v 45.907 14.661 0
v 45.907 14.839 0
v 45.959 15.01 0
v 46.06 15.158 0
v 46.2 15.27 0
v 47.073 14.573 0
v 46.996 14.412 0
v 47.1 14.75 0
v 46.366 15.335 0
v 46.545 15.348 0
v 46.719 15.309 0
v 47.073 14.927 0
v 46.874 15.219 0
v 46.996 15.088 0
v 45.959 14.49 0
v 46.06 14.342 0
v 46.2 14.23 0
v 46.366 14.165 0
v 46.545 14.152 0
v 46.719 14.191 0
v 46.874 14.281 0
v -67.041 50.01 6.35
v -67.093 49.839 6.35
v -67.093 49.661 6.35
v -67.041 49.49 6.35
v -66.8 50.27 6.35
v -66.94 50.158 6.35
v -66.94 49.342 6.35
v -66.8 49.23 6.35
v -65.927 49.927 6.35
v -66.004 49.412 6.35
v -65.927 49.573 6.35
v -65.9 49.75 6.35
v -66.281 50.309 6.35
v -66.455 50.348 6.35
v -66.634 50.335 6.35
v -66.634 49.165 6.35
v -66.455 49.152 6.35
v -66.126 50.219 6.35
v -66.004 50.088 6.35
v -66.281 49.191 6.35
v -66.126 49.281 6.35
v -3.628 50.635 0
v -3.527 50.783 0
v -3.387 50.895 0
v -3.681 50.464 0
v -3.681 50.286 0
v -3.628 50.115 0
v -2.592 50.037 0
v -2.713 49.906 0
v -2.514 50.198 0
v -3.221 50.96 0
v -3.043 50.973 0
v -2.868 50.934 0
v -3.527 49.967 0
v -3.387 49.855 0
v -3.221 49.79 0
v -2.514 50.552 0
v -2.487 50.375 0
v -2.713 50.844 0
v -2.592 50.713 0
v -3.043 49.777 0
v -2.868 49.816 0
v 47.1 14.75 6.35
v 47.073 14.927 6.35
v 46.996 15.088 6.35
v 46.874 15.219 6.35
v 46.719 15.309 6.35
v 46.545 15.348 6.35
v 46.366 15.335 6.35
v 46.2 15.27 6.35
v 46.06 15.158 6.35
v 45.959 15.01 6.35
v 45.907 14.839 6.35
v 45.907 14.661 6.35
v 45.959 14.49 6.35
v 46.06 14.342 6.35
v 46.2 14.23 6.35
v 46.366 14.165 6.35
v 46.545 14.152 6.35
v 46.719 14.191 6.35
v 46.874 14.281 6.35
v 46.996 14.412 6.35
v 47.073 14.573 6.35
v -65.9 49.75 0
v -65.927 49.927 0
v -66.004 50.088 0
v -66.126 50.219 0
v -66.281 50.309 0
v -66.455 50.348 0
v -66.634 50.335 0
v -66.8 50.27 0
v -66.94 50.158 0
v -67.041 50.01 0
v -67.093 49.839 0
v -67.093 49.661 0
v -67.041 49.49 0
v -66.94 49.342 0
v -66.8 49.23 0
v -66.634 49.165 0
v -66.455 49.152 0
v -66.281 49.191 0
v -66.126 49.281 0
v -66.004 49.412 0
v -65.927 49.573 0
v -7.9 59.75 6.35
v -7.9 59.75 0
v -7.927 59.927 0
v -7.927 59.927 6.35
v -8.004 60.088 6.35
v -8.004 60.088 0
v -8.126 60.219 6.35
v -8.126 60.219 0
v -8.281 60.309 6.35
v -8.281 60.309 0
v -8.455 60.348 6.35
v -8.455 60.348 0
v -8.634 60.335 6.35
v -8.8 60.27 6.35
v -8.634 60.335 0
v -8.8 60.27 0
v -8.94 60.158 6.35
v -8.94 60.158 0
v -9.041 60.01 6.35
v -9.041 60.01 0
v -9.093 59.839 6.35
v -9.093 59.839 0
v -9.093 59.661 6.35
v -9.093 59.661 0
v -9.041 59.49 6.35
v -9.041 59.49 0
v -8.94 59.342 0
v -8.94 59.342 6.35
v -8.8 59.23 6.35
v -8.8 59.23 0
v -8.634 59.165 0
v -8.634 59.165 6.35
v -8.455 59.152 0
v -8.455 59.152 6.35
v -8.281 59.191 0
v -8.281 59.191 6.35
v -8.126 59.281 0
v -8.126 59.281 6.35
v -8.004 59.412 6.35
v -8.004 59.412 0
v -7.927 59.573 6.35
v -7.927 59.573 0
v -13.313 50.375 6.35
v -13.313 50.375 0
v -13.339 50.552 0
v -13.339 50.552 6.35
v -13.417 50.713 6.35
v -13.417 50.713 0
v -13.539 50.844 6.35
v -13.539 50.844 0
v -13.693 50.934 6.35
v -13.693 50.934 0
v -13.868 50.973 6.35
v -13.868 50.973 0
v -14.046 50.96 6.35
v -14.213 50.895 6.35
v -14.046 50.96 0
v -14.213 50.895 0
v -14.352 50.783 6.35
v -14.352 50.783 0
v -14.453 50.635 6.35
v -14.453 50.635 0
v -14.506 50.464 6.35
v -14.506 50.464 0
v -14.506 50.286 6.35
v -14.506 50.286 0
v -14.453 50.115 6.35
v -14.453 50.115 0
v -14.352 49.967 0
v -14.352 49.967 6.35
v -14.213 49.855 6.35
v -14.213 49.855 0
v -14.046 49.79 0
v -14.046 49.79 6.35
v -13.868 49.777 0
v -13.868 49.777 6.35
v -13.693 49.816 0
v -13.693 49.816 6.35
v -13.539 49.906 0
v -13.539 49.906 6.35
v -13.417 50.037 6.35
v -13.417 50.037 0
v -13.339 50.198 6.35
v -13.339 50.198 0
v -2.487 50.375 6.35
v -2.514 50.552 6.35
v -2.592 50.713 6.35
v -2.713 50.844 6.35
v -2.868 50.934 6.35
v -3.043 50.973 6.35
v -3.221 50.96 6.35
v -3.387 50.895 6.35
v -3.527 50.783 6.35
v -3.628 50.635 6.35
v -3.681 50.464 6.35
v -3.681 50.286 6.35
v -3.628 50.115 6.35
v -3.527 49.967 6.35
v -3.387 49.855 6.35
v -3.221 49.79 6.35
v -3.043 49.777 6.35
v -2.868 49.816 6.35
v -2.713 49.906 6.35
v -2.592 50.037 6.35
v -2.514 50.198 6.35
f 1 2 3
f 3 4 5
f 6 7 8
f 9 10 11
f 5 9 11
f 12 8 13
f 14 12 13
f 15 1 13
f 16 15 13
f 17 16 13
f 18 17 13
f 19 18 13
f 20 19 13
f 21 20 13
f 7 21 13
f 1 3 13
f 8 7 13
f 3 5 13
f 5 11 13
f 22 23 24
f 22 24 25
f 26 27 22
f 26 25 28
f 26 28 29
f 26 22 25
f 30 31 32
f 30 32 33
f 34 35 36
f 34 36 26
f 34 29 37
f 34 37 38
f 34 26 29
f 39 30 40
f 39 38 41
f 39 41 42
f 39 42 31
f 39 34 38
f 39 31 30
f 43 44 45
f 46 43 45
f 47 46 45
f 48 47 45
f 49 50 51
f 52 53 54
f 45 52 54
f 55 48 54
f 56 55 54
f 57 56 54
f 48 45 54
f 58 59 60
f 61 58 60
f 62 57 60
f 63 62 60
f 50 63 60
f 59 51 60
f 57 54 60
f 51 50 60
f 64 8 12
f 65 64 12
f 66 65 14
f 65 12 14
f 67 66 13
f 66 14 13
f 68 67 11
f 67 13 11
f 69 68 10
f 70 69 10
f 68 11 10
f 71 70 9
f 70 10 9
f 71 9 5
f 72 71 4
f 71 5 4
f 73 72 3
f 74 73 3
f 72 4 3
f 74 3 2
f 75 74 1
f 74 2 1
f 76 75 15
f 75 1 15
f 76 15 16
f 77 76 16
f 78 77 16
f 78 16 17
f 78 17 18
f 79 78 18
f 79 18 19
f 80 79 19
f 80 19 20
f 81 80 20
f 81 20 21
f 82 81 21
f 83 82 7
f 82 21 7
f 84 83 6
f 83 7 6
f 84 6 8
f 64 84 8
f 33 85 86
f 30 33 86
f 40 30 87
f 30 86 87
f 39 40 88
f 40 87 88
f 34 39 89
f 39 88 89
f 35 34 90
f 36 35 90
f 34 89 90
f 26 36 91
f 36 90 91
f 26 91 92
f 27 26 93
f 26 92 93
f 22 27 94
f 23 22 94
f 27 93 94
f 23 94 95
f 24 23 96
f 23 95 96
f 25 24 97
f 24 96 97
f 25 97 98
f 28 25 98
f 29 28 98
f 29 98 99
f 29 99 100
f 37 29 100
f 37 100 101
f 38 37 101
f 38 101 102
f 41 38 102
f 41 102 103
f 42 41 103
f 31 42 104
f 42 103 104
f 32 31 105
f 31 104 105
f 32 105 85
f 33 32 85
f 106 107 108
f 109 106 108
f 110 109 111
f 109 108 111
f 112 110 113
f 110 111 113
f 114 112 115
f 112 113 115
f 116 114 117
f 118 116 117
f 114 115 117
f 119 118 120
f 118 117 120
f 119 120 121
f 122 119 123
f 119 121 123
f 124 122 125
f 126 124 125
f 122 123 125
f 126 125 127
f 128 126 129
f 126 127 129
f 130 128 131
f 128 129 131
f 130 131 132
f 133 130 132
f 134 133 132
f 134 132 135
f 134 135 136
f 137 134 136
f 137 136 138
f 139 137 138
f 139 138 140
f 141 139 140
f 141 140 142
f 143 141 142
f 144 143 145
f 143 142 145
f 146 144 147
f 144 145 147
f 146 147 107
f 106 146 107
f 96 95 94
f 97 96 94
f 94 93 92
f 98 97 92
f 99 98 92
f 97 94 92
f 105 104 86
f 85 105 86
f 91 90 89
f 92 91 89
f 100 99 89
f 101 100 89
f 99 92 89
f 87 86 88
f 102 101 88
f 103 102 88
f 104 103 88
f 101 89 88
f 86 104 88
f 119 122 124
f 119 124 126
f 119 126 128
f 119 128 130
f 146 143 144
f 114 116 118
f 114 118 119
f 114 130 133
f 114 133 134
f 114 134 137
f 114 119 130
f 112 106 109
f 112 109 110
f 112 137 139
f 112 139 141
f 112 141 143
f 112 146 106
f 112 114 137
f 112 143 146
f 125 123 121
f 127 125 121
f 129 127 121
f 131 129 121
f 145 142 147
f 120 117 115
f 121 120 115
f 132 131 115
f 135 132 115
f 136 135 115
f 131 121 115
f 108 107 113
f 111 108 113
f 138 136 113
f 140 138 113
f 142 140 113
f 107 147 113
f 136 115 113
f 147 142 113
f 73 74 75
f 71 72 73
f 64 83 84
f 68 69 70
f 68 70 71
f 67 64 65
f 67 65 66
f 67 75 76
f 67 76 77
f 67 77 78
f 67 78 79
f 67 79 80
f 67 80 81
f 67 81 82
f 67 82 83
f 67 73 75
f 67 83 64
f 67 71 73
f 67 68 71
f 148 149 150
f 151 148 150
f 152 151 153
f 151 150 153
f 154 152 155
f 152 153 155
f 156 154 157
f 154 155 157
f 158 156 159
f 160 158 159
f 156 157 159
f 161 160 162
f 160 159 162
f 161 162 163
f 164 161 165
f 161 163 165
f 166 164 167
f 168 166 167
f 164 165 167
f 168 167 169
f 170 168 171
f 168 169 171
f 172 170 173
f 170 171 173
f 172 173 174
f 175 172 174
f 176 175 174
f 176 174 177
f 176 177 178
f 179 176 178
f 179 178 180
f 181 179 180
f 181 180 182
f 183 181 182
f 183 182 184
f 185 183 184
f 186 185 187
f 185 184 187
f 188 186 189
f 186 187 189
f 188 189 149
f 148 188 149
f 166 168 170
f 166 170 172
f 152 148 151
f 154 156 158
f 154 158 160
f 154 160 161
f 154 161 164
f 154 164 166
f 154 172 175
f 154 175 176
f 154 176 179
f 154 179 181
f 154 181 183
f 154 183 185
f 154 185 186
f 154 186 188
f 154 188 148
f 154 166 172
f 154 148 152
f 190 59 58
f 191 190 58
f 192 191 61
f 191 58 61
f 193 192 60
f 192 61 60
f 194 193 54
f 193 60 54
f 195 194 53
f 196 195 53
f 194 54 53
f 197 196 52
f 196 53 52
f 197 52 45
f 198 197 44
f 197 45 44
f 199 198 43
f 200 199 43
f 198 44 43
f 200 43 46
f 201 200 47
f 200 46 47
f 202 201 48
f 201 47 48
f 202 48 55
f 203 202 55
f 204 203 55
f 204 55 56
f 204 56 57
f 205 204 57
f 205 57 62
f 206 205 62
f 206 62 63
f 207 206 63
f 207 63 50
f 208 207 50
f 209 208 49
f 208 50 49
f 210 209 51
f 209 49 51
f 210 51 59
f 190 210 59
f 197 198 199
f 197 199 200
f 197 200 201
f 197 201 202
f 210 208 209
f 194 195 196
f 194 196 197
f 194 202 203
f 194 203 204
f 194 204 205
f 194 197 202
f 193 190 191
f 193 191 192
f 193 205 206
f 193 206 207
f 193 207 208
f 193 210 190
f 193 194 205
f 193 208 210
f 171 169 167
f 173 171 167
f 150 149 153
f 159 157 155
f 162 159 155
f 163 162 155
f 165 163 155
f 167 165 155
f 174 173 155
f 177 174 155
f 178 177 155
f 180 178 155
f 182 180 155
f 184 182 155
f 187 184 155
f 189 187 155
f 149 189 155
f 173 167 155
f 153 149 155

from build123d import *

# Parameters (mm, degrees)
SKETCH2_R             = 0.6
BOSS_EXTRUDE1_DEPTH   = 6.35
BOSS_EXTRUDE1_2_DEPTH = 6.35
BOSS_EXTRUDE1_3_DEPTH = 6.35
BOSS_EXTRUDE1_4_DEPTH = 6.35
BOSS_EXTRUDE1_5_DEPTH = 6.35


with BuildPart() as part:
    # Sketch2 → Boss-Extrude1 (new body)
    with BuildSketch(Plane.XY):
        with Locations((-3.087341226, 50.375)):
            Circle(SKETCH2_R)
    extrude(amount=BOSS_EXTRUDE1_DEPTH)


with BuildPart() as body_2:
    # Sketch2 → Boss-Extrude1 2 (new body)
    with BuildSketch(Plane.XY):
        with Locations((-8.5, 59.75)):
            Circle(SKETCH2_R)
    extrude(amount=BOSS_EXTRUDE1_2_DEPTH)


with BuildPart() as body_3:
    # Sketch2 → Boss-Extrude1 3 (new body)
    with BuildSketch(Plane.XY):
        with Locations((-13.912658774, 50.375)):
            Circle(SKETCH2_R)
    extrude(amount=BOSS_EXTRUDE1_3_DEPTH)


with BuildPart() as body_4:
    # Sketch2 → Boss-Extrude1 4 (new body)
    with BuildSketch(Plane.XY):
        with Locations((46.5, 14.75)):
            Circle(SKETCH2_R)
    extrude(amount=BOSS_EXTRUDE1_4_DEPTH)


with BuildPart() as body_5:
    # Sketch2 → Boss-Extrude1 5 (new body)
    with BuildSketch(Plane.XY):
        with Locations((-66.5, 49.75)):
            Circle(SKETCH2_R)
    extrude(amount=BOSS_EXTRUDE1_5_DEPTH)


solid = Compound([part.part, body_2.part, body_3.part, body_4.part, body_5.part])
